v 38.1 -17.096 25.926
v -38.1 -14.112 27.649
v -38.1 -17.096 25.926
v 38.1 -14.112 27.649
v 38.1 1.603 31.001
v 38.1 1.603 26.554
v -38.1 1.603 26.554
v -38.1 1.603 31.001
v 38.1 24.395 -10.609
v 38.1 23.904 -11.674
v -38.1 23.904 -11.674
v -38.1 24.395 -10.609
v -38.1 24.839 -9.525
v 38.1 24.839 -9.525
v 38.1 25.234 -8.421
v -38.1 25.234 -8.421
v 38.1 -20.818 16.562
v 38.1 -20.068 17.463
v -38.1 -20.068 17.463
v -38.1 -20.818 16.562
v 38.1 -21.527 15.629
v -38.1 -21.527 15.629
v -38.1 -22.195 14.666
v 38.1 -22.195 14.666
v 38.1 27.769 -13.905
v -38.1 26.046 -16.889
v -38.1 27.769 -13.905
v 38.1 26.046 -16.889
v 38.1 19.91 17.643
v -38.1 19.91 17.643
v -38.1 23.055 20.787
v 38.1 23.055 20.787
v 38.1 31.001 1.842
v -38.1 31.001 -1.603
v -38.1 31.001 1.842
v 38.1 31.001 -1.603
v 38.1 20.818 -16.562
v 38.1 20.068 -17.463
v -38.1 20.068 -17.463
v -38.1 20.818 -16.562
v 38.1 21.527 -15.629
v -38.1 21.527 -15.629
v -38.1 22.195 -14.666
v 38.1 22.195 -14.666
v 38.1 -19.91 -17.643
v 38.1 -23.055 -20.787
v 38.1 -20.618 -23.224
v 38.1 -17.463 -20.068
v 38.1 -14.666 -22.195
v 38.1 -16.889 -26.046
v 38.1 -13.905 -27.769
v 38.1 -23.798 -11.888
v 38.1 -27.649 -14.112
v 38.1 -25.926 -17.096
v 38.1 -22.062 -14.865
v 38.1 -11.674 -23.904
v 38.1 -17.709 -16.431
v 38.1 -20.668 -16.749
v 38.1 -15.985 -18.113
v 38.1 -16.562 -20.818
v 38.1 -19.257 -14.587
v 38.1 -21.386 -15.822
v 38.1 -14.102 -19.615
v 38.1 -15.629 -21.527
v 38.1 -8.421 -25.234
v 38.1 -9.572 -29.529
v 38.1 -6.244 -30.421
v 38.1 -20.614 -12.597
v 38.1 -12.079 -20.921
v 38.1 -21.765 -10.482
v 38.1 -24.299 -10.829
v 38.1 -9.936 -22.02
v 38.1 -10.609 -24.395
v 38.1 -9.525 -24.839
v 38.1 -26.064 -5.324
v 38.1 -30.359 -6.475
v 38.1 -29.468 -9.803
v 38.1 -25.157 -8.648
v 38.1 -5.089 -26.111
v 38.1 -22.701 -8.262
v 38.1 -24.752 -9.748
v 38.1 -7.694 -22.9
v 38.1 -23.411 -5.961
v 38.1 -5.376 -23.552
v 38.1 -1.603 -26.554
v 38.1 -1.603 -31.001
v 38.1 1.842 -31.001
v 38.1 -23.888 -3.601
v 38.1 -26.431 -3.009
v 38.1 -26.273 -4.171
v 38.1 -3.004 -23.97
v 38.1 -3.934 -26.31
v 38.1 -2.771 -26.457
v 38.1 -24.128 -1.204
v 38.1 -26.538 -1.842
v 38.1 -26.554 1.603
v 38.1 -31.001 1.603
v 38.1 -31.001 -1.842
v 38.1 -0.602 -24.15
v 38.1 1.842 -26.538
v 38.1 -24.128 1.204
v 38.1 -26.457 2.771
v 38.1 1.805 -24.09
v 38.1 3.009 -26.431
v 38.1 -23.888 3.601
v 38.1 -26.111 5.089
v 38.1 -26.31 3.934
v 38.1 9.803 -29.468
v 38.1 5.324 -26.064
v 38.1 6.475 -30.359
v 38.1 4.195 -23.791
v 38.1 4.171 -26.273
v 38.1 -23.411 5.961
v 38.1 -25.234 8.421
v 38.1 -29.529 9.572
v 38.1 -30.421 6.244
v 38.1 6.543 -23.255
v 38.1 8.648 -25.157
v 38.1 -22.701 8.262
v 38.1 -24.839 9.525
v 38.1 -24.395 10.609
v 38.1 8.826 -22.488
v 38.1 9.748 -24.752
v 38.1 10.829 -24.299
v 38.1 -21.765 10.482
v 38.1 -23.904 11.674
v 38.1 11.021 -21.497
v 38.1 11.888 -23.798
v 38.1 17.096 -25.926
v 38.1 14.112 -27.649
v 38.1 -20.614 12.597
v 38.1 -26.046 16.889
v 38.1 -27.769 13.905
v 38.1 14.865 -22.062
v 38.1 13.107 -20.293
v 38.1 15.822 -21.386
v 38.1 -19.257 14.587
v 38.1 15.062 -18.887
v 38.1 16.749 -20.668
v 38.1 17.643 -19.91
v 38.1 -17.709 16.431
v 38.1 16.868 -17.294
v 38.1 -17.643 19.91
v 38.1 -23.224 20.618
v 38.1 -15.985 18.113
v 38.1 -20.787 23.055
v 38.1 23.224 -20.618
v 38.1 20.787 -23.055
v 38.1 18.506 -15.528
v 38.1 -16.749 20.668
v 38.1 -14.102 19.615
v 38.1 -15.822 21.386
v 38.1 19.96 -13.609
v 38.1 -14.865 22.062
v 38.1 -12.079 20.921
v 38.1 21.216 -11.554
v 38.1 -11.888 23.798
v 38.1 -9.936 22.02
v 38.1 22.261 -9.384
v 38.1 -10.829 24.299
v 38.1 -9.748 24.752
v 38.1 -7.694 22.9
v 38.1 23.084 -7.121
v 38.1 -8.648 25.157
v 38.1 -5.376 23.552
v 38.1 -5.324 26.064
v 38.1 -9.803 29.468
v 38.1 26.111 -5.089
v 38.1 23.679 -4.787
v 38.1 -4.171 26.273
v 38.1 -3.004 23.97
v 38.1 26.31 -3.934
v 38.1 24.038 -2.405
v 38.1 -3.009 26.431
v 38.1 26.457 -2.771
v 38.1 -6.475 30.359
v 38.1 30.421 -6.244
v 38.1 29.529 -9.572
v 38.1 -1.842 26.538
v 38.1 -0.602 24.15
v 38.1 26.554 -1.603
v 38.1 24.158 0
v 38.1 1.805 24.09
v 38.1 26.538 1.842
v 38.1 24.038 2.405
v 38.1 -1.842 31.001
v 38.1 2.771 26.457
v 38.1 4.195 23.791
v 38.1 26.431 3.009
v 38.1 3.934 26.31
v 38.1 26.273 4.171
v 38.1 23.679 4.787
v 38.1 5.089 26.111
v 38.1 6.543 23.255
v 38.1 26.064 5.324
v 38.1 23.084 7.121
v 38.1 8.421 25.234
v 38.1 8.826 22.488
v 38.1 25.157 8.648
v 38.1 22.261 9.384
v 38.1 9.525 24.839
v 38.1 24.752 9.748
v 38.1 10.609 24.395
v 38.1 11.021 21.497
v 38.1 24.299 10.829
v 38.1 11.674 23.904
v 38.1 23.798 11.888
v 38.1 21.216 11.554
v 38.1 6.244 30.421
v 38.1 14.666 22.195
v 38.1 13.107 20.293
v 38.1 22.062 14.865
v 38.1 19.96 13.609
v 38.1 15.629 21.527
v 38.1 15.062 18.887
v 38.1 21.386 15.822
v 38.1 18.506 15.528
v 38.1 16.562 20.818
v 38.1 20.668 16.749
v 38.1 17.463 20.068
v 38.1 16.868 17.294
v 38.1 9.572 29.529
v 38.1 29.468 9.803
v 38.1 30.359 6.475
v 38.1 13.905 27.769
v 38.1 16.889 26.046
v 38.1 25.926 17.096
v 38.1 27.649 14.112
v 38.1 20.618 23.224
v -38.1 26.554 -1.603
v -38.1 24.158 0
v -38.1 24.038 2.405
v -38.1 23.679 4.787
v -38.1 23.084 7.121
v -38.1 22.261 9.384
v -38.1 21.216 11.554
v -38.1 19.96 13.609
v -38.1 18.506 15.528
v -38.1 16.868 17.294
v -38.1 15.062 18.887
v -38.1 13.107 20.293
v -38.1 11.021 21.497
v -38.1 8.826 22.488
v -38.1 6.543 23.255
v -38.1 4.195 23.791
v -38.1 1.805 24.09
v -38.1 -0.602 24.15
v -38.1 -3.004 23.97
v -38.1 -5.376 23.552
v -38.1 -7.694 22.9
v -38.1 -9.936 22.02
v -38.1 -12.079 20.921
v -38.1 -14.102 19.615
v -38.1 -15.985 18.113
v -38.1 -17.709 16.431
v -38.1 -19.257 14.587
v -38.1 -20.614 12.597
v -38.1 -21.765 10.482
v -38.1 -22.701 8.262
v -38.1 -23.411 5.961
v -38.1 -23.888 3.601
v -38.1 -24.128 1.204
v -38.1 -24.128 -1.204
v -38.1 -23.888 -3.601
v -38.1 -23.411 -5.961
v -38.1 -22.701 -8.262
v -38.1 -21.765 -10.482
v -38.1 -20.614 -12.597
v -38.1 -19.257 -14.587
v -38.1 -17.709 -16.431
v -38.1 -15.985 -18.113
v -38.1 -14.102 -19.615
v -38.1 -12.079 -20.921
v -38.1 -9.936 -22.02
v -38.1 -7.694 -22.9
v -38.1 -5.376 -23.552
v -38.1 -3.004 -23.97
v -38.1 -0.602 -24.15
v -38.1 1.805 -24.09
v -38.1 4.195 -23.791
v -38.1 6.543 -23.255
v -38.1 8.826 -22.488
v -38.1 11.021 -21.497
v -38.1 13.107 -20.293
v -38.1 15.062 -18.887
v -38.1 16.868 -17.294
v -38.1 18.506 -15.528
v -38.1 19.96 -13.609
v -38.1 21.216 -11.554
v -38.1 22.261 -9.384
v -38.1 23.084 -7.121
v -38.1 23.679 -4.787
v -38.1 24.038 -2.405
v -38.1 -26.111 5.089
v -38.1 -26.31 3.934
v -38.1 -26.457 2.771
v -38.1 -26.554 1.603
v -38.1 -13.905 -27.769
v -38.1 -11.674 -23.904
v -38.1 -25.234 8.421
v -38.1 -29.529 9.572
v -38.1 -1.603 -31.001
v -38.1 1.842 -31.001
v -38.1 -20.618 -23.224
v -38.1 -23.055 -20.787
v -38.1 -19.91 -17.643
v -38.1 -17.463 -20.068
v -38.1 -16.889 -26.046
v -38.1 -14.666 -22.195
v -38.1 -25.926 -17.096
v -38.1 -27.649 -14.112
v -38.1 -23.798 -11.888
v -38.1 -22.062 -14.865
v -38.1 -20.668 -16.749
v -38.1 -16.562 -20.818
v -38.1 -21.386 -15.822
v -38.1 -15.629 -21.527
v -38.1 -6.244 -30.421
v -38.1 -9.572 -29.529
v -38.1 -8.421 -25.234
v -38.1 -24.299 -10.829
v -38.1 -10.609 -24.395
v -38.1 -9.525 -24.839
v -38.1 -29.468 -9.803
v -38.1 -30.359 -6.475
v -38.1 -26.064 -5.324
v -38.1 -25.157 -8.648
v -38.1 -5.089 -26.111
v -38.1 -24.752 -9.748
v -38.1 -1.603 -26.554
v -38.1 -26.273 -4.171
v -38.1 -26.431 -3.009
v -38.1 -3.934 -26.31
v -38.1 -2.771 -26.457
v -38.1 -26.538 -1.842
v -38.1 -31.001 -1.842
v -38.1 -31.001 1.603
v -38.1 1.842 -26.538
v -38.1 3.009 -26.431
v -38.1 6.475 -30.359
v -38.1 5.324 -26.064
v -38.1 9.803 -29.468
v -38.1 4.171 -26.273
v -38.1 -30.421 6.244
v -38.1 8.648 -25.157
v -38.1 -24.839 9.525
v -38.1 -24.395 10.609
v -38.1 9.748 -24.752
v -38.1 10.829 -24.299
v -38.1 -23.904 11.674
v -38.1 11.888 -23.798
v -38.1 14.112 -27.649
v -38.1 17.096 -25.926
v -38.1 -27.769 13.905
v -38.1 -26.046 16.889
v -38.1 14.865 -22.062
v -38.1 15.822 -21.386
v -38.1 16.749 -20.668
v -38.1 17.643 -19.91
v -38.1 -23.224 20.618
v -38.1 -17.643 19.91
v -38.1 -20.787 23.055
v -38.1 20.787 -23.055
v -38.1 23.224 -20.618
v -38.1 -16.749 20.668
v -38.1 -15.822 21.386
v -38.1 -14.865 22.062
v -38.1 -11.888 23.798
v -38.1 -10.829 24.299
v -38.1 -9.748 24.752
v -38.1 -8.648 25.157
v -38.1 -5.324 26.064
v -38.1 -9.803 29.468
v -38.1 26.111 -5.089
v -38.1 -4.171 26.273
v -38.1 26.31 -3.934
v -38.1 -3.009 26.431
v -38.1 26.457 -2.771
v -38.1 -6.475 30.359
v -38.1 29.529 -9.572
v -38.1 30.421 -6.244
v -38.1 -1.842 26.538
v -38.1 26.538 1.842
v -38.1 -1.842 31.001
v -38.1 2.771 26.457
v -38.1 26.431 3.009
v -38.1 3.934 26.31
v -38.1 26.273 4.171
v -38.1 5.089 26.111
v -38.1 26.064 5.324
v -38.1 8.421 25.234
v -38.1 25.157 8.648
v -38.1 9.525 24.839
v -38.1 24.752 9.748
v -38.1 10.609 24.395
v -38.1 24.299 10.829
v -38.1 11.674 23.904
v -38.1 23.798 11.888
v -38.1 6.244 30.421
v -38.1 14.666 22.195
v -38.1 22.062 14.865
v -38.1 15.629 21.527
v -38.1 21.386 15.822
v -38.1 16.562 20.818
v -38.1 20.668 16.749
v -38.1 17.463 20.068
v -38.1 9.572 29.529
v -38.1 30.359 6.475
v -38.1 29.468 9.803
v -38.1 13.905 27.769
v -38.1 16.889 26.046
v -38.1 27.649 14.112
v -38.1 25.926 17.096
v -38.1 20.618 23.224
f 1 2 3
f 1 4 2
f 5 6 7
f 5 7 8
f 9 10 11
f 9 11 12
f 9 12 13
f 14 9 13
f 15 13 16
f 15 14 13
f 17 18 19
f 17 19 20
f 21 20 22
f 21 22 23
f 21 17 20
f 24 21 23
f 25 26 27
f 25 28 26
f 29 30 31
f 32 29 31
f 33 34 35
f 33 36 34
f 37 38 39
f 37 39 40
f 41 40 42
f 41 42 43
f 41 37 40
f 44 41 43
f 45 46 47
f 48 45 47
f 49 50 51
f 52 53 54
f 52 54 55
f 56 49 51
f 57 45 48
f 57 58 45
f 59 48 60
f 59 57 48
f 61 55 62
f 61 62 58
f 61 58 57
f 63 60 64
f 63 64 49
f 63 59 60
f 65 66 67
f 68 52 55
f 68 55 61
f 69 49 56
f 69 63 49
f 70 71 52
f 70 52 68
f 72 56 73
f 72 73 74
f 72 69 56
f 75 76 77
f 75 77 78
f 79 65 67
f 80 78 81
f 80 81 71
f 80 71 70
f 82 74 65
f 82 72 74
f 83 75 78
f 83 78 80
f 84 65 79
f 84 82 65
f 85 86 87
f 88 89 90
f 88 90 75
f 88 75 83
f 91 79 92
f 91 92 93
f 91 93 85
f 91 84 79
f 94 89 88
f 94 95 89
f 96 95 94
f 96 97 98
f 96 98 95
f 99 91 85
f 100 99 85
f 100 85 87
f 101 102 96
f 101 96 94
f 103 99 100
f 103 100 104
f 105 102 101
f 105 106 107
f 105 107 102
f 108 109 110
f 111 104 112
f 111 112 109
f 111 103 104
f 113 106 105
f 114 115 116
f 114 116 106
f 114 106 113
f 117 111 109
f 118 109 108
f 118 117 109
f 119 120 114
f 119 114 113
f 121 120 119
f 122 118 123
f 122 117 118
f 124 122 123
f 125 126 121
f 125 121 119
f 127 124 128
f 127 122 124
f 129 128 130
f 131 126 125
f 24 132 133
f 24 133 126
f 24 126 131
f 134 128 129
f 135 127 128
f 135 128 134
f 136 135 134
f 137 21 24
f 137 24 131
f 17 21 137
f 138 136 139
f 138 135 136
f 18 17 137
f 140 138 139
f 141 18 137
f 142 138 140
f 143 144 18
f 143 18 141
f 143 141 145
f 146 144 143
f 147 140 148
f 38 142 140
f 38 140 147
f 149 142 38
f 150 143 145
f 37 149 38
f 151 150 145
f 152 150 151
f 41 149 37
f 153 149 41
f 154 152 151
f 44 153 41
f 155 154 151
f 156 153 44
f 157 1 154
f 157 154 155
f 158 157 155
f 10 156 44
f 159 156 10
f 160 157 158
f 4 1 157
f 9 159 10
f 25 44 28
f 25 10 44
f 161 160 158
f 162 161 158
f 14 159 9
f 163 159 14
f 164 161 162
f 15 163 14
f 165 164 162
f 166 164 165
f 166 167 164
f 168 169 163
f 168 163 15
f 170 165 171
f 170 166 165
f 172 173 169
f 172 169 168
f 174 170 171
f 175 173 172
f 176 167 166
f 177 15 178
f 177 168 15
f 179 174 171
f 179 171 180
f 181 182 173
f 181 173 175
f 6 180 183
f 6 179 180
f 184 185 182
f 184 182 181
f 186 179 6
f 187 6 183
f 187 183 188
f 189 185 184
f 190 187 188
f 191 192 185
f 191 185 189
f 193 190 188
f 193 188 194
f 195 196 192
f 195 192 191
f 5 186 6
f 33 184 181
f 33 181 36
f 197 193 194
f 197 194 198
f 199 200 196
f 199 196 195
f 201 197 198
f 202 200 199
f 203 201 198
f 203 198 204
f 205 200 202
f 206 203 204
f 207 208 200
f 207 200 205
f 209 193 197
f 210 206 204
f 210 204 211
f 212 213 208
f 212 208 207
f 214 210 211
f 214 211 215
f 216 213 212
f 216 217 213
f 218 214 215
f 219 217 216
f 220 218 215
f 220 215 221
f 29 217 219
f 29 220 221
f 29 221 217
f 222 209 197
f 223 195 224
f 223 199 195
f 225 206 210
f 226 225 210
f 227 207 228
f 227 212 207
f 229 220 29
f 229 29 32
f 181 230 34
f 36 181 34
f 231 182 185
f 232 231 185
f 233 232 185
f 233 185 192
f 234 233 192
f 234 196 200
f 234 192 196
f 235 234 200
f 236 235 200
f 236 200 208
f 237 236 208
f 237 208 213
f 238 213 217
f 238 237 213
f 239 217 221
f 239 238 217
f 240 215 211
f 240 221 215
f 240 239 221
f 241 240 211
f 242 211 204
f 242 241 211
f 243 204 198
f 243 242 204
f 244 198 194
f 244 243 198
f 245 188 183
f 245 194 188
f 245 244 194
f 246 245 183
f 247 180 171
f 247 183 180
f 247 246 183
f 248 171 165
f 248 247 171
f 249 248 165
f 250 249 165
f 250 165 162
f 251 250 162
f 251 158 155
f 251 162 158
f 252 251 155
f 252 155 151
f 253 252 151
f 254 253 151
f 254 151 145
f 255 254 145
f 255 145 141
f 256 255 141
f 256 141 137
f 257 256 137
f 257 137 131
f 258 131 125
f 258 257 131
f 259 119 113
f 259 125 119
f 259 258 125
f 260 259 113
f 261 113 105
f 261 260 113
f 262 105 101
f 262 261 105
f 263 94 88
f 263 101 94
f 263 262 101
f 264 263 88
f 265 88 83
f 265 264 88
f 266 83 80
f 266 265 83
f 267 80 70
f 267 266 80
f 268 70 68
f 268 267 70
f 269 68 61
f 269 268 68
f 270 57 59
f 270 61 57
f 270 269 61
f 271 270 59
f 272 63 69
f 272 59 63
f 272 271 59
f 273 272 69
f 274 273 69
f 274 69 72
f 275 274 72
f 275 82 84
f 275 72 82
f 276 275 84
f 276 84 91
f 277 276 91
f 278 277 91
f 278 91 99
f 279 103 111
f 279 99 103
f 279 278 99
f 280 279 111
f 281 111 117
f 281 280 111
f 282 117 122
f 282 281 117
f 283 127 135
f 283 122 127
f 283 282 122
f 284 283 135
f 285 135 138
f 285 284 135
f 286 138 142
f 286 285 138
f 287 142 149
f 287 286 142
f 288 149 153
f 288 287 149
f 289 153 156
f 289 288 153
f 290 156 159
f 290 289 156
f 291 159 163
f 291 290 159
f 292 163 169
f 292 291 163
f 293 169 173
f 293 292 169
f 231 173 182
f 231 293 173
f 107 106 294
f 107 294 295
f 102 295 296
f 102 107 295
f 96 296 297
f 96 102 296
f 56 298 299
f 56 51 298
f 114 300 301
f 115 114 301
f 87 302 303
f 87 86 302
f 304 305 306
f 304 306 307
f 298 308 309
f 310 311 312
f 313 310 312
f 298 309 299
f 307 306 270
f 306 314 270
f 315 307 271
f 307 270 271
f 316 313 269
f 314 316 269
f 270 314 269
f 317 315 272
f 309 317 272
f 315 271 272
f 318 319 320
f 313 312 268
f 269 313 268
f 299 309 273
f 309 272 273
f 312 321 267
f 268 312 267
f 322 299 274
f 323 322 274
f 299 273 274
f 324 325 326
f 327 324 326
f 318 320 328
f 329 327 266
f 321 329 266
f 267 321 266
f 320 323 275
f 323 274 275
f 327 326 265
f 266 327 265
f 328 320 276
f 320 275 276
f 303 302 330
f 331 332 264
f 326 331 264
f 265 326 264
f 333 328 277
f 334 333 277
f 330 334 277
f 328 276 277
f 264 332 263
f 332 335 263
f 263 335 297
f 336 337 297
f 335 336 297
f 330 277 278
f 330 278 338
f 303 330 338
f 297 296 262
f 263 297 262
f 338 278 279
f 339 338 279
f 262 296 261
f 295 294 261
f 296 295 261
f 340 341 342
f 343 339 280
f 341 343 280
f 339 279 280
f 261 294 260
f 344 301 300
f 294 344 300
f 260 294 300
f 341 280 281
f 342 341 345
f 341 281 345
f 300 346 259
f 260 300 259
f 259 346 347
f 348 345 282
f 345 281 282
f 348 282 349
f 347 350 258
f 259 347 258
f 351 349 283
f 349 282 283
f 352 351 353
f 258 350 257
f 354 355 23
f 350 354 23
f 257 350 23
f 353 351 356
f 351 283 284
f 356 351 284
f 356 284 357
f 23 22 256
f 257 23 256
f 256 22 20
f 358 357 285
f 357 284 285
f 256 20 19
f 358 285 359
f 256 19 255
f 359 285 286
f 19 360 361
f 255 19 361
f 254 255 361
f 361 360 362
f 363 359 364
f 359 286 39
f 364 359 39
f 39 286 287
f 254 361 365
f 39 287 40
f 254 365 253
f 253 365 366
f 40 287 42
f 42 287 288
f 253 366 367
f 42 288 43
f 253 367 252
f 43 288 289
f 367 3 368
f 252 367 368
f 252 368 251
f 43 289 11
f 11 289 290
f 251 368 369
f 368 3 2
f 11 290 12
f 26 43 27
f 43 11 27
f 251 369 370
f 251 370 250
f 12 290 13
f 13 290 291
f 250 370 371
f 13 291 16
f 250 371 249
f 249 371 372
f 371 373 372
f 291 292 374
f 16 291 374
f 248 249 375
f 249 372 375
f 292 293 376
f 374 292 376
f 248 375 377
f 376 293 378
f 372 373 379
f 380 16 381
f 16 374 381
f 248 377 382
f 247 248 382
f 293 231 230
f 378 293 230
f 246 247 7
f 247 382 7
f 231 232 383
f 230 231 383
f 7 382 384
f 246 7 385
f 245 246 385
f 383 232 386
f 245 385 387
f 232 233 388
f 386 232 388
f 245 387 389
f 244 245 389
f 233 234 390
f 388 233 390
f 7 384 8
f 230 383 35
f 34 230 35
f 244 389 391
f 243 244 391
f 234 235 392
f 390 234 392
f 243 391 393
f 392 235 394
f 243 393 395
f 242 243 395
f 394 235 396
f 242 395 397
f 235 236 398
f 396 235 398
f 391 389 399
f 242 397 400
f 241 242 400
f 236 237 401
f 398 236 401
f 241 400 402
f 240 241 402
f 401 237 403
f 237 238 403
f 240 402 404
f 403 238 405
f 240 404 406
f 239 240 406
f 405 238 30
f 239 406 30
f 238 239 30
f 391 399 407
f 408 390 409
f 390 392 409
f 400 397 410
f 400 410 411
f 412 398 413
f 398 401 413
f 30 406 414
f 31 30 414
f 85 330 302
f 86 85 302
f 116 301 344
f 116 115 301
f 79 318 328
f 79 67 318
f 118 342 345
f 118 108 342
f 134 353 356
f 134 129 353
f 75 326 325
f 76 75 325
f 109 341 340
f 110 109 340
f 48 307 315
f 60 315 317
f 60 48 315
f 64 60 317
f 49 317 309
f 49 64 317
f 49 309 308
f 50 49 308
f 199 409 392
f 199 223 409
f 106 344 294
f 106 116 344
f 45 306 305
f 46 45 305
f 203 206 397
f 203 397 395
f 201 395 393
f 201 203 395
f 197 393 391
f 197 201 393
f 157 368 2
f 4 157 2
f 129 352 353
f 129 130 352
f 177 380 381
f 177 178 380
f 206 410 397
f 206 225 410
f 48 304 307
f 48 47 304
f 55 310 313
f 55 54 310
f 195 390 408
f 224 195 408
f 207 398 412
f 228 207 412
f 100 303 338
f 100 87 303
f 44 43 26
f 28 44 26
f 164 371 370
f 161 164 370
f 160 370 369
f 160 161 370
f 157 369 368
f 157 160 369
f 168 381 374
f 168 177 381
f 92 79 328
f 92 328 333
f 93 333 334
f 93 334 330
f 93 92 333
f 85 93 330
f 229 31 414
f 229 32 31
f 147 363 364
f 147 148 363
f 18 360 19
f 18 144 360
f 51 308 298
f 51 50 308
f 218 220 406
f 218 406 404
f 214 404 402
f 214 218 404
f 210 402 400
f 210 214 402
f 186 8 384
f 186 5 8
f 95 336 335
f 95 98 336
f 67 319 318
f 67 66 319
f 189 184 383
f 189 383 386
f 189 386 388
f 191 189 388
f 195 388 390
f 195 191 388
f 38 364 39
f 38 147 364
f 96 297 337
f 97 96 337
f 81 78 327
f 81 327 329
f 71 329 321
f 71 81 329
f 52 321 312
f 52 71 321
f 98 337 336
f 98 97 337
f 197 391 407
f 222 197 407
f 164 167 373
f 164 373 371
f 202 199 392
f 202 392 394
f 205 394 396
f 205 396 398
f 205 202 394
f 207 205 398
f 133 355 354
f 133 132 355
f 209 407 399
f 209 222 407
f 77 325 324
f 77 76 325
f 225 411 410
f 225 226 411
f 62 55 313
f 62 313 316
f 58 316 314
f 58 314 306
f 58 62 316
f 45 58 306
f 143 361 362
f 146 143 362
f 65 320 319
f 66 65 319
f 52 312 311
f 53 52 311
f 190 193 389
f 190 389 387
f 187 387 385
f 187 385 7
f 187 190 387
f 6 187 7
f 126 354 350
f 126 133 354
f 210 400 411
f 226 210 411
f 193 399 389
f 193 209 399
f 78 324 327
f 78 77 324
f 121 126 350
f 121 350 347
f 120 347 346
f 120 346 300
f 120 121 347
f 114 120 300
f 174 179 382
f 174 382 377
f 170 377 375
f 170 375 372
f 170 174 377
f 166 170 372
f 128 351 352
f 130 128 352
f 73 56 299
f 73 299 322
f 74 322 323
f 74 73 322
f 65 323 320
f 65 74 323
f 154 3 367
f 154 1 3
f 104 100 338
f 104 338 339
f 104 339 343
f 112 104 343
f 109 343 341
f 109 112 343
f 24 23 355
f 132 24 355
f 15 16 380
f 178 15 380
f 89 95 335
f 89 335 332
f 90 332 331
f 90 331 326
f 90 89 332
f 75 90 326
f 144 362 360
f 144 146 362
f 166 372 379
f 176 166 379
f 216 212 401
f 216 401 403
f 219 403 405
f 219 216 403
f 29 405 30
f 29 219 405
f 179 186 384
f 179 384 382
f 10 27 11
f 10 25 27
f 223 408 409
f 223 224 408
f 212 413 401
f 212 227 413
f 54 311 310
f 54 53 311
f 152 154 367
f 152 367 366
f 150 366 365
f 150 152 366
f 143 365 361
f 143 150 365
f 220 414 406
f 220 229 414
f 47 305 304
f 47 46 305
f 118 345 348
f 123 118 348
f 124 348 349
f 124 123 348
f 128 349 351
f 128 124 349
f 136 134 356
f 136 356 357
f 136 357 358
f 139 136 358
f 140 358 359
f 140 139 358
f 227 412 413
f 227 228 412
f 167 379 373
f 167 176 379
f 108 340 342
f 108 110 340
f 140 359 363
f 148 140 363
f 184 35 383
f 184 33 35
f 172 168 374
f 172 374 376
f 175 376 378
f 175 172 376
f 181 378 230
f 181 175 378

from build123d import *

# Parameters (mm, degrees)
F0_R     = 24.15767
F1_DEPTH = 38.1
F2_COUNT = 24


with BuildPart() as f1:
    # F0 (on Right) → F1 (new body, symmetric)
    with BuildSketch(Plane.YZ):
        with BuildLine():
            ThreePointArc((-1.84246, 26.538285), (-18.147477, -19.451076), (26.602166, 0))
            ThreePointArc((26.602166, 0), (19.369196, 18.234843), (1.603488, 26.553796))
            ThreePointArc((1.603488, 26.553796), (-0.119738, 26.601897), (-1.84246, 26.538285))
        make_face()
        Circle(F0_R, mode=Mode.SUBTRACT)
        with BuildLine():
            ThreePointArc((-1.84246, 26.538285), (-0.119738, 26.601897), (1.603488, 26.553796))
            Line((1.603488, 26.553796), (1.603488, 31.000791))
            Line((1.603488, 31.000791), (-1.84246, 31.000791))
            Line((-1.84246, 31.000791), (-1.84246, 26.538285))
        make_face()
    extrude(amount=F1_DEPTH, both=True)

    # F2: F1 ×24 about axis
    f2_axis = Axis((0, 0, 0), (1, 0, 0))


with BuildPart() as f1_1:
    add(f1.part)
    for i in range(1, F2_COUNT):
        add(f1.part.rotate(f2_axis, i * 360 / F2_COUNT))


solid = f1_1.part
